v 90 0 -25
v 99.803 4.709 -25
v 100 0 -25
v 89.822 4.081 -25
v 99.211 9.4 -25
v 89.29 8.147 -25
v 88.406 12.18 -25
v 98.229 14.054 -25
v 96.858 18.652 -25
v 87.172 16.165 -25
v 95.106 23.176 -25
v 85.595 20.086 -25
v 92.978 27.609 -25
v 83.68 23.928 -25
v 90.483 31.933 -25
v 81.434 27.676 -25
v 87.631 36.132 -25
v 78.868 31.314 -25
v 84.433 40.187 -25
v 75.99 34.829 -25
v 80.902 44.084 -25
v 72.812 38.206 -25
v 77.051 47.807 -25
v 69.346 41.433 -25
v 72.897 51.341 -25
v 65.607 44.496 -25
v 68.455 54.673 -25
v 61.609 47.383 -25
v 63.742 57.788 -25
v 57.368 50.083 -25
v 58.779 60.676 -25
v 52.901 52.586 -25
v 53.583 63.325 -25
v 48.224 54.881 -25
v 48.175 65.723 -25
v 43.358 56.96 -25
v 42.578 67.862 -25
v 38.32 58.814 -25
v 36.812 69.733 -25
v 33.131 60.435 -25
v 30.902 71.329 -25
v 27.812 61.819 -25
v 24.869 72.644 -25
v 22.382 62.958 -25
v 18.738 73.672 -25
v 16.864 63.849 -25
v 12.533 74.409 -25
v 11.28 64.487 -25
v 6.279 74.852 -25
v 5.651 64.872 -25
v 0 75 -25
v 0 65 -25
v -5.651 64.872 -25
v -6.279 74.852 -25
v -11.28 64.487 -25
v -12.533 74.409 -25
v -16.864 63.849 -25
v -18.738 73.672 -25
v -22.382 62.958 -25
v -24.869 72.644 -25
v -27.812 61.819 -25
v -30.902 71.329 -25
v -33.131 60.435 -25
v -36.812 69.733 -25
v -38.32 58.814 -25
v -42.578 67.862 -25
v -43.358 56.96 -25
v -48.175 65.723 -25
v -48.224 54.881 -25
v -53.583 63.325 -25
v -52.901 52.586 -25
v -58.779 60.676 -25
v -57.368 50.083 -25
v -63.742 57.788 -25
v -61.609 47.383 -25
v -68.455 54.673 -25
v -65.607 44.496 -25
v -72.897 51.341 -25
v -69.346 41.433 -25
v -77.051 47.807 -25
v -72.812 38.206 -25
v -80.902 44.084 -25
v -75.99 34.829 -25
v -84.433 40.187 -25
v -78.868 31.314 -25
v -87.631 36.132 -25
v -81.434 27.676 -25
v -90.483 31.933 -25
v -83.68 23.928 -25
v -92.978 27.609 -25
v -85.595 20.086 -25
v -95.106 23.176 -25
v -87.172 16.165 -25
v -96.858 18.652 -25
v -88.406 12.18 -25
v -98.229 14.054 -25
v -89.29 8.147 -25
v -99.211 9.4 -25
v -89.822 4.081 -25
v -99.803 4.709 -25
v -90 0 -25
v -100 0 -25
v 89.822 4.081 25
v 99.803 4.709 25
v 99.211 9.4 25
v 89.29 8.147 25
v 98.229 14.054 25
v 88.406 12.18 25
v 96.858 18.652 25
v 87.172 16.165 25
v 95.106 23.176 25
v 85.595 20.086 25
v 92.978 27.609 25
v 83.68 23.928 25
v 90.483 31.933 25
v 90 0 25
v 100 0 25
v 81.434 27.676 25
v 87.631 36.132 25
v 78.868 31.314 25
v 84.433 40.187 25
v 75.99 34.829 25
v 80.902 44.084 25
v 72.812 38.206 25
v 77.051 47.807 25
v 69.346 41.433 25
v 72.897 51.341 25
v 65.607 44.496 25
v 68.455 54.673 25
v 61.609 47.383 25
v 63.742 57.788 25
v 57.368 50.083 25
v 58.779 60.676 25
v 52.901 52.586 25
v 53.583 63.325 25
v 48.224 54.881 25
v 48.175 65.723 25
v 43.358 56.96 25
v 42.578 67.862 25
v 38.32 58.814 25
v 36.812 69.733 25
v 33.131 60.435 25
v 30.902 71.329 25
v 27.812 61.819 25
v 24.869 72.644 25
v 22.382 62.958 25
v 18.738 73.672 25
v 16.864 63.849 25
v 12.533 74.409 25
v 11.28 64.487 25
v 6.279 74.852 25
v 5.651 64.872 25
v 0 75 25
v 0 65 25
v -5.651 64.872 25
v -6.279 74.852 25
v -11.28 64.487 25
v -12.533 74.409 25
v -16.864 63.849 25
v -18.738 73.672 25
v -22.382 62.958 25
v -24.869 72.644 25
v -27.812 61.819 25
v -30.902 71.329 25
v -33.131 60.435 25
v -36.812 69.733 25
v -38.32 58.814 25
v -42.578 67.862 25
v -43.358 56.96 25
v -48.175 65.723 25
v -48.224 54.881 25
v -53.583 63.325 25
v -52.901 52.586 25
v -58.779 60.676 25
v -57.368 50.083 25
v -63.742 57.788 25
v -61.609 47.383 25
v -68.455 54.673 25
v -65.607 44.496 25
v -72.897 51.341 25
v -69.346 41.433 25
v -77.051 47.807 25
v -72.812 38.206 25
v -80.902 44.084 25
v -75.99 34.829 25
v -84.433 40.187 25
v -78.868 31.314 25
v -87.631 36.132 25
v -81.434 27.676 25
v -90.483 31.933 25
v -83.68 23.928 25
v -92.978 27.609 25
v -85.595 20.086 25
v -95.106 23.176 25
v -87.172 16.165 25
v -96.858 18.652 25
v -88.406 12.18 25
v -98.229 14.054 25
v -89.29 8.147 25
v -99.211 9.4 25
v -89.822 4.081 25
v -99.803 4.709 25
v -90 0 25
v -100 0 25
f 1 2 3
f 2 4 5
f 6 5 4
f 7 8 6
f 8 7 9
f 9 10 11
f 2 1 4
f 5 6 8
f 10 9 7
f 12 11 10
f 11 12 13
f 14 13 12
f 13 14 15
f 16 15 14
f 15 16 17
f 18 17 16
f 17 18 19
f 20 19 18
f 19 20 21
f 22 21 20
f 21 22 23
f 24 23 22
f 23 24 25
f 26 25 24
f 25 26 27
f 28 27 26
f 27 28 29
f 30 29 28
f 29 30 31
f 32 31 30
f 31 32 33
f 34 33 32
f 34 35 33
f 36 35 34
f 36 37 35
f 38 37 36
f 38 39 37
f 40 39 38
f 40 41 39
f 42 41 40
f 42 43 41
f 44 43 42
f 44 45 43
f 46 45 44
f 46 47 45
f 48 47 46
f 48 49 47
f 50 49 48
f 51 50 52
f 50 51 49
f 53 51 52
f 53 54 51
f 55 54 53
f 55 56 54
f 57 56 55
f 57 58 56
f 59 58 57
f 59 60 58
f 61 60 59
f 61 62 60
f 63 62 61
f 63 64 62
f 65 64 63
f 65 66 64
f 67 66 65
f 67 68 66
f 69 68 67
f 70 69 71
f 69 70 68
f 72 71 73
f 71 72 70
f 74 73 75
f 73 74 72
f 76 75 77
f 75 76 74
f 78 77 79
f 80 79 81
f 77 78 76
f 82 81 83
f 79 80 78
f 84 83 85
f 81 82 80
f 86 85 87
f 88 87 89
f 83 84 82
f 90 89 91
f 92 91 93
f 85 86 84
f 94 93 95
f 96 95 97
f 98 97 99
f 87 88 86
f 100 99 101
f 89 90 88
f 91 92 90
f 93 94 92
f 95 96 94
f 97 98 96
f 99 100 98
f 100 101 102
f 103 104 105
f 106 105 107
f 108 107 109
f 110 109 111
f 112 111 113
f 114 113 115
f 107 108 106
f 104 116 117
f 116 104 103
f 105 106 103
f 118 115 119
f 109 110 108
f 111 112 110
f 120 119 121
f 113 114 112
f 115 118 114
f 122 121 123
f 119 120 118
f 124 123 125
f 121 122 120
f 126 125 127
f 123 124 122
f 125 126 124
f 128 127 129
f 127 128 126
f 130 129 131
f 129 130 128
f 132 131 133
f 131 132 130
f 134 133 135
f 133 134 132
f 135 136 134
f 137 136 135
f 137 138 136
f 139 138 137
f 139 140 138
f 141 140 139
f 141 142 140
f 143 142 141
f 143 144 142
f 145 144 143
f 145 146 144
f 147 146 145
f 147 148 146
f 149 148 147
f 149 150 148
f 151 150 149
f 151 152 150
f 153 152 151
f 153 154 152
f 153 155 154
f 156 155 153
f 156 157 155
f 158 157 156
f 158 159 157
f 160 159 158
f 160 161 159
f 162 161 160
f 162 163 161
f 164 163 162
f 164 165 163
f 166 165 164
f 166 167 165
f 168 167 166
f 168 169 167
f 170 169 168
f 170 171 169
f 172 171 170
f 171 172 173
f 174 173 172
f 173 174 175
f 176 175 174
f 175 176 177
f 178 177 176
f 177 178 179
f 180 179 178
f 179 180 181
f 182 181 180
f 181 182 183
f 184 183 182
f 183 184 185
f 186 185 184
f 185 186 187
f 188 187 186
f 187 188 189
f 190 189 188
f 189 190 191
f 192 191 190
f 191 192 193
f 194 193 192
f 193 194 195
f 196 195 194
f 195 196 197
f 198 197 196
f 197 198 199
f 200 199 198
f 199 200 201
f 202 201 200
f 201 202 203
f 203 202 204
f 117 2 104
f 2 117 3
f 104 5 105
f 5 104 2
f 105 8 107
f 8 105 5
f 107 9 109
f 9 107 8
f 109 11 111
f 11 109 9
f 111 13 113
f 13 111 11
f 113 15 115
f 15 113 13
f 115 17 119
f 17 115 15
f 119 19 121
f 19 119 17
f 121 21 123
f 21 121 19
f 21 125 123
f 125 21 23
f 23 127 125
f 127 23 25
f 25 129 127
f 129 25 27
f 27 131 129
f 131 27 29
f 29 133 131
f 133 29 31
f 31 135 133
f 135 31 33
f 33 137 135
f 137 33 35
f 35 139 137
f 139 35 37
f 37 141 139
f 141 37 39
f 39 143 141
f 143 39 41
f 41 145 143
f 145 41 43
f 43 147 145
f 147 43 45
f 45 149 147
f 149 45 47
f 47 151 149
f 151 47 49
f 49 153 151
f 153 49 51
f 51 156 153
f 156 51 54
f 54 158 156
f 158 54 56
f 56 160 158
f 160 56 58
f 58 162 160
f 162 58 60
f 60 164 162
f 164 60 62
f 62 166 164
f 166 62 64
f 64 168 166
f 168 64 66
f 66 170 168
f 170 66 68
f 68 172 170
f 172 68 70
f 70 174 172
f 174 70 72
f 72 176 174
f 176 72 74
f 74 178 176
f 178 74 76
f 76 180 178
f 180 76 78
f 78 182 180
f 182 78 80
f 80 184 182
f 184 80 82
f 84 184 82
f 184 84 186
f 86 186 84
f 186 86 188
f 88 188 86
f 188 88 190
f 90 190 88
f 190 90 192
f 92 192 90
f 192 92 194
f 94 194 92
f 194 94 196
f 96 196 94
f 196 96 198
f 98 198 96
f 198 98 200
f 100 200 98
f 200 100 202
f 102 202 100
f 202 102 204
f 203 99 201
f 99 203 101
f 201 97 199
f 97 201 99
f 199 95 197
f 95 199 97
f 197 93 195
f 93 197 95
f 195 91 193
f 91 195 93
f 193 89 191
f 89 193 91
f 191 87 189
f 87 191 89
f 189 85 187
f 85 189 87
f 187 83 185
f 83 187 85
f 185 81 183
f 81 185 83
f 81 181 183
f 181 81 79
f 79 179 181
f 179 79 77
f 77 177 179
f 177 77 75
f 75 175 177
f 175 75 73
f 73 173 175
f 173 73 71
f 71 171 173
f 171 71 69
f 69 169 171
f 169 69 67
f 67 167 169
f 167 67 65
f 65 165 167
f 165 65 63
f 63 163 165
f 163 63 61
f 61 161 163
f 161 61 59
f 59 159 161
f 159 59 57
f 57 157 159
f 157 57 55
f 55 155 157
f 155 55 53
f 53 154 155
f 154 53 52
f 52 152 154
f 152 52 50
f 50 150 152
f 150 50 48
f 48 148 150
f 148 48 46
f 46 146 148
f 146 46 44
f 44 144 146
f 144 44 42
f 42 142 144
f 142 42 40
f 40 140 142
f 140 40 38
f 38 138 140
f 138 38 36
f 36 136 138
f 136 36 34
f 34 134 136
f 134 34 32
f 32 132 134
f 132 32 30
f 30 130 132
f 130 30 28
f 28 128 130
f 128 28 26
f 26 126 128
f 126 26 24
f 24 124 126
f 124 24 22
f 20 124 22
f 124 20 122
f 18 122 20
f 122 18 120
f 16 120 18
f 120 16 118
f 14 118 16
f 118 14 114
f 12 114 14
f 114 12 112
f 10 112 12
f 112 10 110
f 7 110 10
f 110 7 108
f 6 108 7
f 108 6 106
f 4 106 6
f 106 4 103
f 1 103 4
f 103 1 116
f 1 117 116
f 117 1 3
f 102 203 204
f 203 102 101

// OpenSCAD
/*
 * Example 3, from https://en.wikibooks.org/wiki/OpenSCAD_User_Manual/Primitive_Solids#polyhedron
 *
 * Many true / false option at the bottom of the file.
 */
module prism(l, w, h) {
  polyhedron(
    points = [
      [0,0,0], // 0
      [l,0,0], // 1  
      [l,w,0], // 2
      [0,w,0], // 3
      [0,w,h], // 4
      [l,w,h]  // 5
    ],
    faces = [
      [0,1,2,3], // Bottom, A
      [5,4,3,2], // Front, B 
      [0,4,5,1], // Back, the slope, C
      [0,3,4],   // Left, vertical, D
      [5,2,1]    // Right, vertical, E
    ]
  );
       
  // preview unfolded (do not include in your function)
  z = 0.08;
  separation = 2; // Between prism anf first flattened panel.
  border = .2; // Between panels, when flattened.
  translate([0, w + separation, 0])
    cube([l, w, z]);
  translate([0, w + separation+w+border, 0])
    cube([l, h, z]);
  translate([0, w + separation + w + border + h + border, 0])
    cube([l, sqrt(w * w + h * h), z]);
  translate([l + border, w + separation + w + border + h + border, 0])
    polyhedron(
      points = [
        [0, 0, 0], 
        [h, 0, 0], 
        [0, sqrt(w * w + h * h), 0], 
        [0, 0, z], 
        [h, 0, z], 
        [0, sqrt(w * w + h * h), z]
      ],
      faces = [
        [0, 1, 2], 
        [3, 5, 4], 
        [0, 3, 4, 1], 
        [1, 4, 5, 2], 
        [2, 5, 3, 0]
      ]
    );
  translate([0 - border, w + separation + w + border + h + border, 0])
    polyhedron(
      points = [
        [0, 0, 0],
        [0 - h, 0, 0],
        [0, sqrt(w * w + h * h), 0], 
        [0, 0, z],
        [0 - h, 0, z],
        [0, sqrt(w * w + h * h), z]
      ],
      faces = [
        [1, 0, 2],
        [5, 3, 4],
        [0, 1, 4, 3],
        [1, 2, 5, 4],
        [2, 0, 3, 5]
      ]
    );
}
   
w = 100;
l = 50;
h = 30;

diam = 10;
// Draw a prism
if (false) {
    prism(w, l, h);
}

// Prism with a hole in it.
if (false) {
	difference() {
			prism(w, l, h);
			translate([w/2, l/2, h/2]) {
					cylinder(h=2*h, d1=diam, d2=diam, center=true); 
			}
	}
}

// A tube
if (false) {
    translate([w/2, l/2, h/2]) {
        difference() {  
            cylinder(h=2*h, d1=diam, d2=diam, center=true);
            cylinder(h=2*h, d1=diam*0.9, d2=diam*0.9, center=true);
        }
    }
}
 
module roundedRect(size, radius) {  // more elegant version
  linear_extrude(height=size.z, center=true) {
    offset(radius) offset(-radius) {
      square([size.x, size.y], center = true);
    }
  }
}

if (false) {
    roundedRect([10, 10, 1], 3);
}

module ellipse(D, d) {
	resize([D, d]) {
		circle(d=(D + d) / 2, $fn=100);
	}
}

// Simple ellipse
if (false) {
	ellipse(200, 150);
}

// Elliptic Tube
if (false) {
  linear_extrude(height=50, center=true) {
		difference() {
			ellipse(200, 150);
			ellipse(180, 130);
		}
	}
}

// Elliptic half tube
if (true) {
	intersection() {
		linear_extrude(height=50, center=true) {
			difference() {
				ellipse(200, 150);
				ellipse(180, 130);
			}
		}
		translate([0, 150 / 4, 0]) {
			cube([200, 150 / 2, 50], center=true);
		}
	}
}
